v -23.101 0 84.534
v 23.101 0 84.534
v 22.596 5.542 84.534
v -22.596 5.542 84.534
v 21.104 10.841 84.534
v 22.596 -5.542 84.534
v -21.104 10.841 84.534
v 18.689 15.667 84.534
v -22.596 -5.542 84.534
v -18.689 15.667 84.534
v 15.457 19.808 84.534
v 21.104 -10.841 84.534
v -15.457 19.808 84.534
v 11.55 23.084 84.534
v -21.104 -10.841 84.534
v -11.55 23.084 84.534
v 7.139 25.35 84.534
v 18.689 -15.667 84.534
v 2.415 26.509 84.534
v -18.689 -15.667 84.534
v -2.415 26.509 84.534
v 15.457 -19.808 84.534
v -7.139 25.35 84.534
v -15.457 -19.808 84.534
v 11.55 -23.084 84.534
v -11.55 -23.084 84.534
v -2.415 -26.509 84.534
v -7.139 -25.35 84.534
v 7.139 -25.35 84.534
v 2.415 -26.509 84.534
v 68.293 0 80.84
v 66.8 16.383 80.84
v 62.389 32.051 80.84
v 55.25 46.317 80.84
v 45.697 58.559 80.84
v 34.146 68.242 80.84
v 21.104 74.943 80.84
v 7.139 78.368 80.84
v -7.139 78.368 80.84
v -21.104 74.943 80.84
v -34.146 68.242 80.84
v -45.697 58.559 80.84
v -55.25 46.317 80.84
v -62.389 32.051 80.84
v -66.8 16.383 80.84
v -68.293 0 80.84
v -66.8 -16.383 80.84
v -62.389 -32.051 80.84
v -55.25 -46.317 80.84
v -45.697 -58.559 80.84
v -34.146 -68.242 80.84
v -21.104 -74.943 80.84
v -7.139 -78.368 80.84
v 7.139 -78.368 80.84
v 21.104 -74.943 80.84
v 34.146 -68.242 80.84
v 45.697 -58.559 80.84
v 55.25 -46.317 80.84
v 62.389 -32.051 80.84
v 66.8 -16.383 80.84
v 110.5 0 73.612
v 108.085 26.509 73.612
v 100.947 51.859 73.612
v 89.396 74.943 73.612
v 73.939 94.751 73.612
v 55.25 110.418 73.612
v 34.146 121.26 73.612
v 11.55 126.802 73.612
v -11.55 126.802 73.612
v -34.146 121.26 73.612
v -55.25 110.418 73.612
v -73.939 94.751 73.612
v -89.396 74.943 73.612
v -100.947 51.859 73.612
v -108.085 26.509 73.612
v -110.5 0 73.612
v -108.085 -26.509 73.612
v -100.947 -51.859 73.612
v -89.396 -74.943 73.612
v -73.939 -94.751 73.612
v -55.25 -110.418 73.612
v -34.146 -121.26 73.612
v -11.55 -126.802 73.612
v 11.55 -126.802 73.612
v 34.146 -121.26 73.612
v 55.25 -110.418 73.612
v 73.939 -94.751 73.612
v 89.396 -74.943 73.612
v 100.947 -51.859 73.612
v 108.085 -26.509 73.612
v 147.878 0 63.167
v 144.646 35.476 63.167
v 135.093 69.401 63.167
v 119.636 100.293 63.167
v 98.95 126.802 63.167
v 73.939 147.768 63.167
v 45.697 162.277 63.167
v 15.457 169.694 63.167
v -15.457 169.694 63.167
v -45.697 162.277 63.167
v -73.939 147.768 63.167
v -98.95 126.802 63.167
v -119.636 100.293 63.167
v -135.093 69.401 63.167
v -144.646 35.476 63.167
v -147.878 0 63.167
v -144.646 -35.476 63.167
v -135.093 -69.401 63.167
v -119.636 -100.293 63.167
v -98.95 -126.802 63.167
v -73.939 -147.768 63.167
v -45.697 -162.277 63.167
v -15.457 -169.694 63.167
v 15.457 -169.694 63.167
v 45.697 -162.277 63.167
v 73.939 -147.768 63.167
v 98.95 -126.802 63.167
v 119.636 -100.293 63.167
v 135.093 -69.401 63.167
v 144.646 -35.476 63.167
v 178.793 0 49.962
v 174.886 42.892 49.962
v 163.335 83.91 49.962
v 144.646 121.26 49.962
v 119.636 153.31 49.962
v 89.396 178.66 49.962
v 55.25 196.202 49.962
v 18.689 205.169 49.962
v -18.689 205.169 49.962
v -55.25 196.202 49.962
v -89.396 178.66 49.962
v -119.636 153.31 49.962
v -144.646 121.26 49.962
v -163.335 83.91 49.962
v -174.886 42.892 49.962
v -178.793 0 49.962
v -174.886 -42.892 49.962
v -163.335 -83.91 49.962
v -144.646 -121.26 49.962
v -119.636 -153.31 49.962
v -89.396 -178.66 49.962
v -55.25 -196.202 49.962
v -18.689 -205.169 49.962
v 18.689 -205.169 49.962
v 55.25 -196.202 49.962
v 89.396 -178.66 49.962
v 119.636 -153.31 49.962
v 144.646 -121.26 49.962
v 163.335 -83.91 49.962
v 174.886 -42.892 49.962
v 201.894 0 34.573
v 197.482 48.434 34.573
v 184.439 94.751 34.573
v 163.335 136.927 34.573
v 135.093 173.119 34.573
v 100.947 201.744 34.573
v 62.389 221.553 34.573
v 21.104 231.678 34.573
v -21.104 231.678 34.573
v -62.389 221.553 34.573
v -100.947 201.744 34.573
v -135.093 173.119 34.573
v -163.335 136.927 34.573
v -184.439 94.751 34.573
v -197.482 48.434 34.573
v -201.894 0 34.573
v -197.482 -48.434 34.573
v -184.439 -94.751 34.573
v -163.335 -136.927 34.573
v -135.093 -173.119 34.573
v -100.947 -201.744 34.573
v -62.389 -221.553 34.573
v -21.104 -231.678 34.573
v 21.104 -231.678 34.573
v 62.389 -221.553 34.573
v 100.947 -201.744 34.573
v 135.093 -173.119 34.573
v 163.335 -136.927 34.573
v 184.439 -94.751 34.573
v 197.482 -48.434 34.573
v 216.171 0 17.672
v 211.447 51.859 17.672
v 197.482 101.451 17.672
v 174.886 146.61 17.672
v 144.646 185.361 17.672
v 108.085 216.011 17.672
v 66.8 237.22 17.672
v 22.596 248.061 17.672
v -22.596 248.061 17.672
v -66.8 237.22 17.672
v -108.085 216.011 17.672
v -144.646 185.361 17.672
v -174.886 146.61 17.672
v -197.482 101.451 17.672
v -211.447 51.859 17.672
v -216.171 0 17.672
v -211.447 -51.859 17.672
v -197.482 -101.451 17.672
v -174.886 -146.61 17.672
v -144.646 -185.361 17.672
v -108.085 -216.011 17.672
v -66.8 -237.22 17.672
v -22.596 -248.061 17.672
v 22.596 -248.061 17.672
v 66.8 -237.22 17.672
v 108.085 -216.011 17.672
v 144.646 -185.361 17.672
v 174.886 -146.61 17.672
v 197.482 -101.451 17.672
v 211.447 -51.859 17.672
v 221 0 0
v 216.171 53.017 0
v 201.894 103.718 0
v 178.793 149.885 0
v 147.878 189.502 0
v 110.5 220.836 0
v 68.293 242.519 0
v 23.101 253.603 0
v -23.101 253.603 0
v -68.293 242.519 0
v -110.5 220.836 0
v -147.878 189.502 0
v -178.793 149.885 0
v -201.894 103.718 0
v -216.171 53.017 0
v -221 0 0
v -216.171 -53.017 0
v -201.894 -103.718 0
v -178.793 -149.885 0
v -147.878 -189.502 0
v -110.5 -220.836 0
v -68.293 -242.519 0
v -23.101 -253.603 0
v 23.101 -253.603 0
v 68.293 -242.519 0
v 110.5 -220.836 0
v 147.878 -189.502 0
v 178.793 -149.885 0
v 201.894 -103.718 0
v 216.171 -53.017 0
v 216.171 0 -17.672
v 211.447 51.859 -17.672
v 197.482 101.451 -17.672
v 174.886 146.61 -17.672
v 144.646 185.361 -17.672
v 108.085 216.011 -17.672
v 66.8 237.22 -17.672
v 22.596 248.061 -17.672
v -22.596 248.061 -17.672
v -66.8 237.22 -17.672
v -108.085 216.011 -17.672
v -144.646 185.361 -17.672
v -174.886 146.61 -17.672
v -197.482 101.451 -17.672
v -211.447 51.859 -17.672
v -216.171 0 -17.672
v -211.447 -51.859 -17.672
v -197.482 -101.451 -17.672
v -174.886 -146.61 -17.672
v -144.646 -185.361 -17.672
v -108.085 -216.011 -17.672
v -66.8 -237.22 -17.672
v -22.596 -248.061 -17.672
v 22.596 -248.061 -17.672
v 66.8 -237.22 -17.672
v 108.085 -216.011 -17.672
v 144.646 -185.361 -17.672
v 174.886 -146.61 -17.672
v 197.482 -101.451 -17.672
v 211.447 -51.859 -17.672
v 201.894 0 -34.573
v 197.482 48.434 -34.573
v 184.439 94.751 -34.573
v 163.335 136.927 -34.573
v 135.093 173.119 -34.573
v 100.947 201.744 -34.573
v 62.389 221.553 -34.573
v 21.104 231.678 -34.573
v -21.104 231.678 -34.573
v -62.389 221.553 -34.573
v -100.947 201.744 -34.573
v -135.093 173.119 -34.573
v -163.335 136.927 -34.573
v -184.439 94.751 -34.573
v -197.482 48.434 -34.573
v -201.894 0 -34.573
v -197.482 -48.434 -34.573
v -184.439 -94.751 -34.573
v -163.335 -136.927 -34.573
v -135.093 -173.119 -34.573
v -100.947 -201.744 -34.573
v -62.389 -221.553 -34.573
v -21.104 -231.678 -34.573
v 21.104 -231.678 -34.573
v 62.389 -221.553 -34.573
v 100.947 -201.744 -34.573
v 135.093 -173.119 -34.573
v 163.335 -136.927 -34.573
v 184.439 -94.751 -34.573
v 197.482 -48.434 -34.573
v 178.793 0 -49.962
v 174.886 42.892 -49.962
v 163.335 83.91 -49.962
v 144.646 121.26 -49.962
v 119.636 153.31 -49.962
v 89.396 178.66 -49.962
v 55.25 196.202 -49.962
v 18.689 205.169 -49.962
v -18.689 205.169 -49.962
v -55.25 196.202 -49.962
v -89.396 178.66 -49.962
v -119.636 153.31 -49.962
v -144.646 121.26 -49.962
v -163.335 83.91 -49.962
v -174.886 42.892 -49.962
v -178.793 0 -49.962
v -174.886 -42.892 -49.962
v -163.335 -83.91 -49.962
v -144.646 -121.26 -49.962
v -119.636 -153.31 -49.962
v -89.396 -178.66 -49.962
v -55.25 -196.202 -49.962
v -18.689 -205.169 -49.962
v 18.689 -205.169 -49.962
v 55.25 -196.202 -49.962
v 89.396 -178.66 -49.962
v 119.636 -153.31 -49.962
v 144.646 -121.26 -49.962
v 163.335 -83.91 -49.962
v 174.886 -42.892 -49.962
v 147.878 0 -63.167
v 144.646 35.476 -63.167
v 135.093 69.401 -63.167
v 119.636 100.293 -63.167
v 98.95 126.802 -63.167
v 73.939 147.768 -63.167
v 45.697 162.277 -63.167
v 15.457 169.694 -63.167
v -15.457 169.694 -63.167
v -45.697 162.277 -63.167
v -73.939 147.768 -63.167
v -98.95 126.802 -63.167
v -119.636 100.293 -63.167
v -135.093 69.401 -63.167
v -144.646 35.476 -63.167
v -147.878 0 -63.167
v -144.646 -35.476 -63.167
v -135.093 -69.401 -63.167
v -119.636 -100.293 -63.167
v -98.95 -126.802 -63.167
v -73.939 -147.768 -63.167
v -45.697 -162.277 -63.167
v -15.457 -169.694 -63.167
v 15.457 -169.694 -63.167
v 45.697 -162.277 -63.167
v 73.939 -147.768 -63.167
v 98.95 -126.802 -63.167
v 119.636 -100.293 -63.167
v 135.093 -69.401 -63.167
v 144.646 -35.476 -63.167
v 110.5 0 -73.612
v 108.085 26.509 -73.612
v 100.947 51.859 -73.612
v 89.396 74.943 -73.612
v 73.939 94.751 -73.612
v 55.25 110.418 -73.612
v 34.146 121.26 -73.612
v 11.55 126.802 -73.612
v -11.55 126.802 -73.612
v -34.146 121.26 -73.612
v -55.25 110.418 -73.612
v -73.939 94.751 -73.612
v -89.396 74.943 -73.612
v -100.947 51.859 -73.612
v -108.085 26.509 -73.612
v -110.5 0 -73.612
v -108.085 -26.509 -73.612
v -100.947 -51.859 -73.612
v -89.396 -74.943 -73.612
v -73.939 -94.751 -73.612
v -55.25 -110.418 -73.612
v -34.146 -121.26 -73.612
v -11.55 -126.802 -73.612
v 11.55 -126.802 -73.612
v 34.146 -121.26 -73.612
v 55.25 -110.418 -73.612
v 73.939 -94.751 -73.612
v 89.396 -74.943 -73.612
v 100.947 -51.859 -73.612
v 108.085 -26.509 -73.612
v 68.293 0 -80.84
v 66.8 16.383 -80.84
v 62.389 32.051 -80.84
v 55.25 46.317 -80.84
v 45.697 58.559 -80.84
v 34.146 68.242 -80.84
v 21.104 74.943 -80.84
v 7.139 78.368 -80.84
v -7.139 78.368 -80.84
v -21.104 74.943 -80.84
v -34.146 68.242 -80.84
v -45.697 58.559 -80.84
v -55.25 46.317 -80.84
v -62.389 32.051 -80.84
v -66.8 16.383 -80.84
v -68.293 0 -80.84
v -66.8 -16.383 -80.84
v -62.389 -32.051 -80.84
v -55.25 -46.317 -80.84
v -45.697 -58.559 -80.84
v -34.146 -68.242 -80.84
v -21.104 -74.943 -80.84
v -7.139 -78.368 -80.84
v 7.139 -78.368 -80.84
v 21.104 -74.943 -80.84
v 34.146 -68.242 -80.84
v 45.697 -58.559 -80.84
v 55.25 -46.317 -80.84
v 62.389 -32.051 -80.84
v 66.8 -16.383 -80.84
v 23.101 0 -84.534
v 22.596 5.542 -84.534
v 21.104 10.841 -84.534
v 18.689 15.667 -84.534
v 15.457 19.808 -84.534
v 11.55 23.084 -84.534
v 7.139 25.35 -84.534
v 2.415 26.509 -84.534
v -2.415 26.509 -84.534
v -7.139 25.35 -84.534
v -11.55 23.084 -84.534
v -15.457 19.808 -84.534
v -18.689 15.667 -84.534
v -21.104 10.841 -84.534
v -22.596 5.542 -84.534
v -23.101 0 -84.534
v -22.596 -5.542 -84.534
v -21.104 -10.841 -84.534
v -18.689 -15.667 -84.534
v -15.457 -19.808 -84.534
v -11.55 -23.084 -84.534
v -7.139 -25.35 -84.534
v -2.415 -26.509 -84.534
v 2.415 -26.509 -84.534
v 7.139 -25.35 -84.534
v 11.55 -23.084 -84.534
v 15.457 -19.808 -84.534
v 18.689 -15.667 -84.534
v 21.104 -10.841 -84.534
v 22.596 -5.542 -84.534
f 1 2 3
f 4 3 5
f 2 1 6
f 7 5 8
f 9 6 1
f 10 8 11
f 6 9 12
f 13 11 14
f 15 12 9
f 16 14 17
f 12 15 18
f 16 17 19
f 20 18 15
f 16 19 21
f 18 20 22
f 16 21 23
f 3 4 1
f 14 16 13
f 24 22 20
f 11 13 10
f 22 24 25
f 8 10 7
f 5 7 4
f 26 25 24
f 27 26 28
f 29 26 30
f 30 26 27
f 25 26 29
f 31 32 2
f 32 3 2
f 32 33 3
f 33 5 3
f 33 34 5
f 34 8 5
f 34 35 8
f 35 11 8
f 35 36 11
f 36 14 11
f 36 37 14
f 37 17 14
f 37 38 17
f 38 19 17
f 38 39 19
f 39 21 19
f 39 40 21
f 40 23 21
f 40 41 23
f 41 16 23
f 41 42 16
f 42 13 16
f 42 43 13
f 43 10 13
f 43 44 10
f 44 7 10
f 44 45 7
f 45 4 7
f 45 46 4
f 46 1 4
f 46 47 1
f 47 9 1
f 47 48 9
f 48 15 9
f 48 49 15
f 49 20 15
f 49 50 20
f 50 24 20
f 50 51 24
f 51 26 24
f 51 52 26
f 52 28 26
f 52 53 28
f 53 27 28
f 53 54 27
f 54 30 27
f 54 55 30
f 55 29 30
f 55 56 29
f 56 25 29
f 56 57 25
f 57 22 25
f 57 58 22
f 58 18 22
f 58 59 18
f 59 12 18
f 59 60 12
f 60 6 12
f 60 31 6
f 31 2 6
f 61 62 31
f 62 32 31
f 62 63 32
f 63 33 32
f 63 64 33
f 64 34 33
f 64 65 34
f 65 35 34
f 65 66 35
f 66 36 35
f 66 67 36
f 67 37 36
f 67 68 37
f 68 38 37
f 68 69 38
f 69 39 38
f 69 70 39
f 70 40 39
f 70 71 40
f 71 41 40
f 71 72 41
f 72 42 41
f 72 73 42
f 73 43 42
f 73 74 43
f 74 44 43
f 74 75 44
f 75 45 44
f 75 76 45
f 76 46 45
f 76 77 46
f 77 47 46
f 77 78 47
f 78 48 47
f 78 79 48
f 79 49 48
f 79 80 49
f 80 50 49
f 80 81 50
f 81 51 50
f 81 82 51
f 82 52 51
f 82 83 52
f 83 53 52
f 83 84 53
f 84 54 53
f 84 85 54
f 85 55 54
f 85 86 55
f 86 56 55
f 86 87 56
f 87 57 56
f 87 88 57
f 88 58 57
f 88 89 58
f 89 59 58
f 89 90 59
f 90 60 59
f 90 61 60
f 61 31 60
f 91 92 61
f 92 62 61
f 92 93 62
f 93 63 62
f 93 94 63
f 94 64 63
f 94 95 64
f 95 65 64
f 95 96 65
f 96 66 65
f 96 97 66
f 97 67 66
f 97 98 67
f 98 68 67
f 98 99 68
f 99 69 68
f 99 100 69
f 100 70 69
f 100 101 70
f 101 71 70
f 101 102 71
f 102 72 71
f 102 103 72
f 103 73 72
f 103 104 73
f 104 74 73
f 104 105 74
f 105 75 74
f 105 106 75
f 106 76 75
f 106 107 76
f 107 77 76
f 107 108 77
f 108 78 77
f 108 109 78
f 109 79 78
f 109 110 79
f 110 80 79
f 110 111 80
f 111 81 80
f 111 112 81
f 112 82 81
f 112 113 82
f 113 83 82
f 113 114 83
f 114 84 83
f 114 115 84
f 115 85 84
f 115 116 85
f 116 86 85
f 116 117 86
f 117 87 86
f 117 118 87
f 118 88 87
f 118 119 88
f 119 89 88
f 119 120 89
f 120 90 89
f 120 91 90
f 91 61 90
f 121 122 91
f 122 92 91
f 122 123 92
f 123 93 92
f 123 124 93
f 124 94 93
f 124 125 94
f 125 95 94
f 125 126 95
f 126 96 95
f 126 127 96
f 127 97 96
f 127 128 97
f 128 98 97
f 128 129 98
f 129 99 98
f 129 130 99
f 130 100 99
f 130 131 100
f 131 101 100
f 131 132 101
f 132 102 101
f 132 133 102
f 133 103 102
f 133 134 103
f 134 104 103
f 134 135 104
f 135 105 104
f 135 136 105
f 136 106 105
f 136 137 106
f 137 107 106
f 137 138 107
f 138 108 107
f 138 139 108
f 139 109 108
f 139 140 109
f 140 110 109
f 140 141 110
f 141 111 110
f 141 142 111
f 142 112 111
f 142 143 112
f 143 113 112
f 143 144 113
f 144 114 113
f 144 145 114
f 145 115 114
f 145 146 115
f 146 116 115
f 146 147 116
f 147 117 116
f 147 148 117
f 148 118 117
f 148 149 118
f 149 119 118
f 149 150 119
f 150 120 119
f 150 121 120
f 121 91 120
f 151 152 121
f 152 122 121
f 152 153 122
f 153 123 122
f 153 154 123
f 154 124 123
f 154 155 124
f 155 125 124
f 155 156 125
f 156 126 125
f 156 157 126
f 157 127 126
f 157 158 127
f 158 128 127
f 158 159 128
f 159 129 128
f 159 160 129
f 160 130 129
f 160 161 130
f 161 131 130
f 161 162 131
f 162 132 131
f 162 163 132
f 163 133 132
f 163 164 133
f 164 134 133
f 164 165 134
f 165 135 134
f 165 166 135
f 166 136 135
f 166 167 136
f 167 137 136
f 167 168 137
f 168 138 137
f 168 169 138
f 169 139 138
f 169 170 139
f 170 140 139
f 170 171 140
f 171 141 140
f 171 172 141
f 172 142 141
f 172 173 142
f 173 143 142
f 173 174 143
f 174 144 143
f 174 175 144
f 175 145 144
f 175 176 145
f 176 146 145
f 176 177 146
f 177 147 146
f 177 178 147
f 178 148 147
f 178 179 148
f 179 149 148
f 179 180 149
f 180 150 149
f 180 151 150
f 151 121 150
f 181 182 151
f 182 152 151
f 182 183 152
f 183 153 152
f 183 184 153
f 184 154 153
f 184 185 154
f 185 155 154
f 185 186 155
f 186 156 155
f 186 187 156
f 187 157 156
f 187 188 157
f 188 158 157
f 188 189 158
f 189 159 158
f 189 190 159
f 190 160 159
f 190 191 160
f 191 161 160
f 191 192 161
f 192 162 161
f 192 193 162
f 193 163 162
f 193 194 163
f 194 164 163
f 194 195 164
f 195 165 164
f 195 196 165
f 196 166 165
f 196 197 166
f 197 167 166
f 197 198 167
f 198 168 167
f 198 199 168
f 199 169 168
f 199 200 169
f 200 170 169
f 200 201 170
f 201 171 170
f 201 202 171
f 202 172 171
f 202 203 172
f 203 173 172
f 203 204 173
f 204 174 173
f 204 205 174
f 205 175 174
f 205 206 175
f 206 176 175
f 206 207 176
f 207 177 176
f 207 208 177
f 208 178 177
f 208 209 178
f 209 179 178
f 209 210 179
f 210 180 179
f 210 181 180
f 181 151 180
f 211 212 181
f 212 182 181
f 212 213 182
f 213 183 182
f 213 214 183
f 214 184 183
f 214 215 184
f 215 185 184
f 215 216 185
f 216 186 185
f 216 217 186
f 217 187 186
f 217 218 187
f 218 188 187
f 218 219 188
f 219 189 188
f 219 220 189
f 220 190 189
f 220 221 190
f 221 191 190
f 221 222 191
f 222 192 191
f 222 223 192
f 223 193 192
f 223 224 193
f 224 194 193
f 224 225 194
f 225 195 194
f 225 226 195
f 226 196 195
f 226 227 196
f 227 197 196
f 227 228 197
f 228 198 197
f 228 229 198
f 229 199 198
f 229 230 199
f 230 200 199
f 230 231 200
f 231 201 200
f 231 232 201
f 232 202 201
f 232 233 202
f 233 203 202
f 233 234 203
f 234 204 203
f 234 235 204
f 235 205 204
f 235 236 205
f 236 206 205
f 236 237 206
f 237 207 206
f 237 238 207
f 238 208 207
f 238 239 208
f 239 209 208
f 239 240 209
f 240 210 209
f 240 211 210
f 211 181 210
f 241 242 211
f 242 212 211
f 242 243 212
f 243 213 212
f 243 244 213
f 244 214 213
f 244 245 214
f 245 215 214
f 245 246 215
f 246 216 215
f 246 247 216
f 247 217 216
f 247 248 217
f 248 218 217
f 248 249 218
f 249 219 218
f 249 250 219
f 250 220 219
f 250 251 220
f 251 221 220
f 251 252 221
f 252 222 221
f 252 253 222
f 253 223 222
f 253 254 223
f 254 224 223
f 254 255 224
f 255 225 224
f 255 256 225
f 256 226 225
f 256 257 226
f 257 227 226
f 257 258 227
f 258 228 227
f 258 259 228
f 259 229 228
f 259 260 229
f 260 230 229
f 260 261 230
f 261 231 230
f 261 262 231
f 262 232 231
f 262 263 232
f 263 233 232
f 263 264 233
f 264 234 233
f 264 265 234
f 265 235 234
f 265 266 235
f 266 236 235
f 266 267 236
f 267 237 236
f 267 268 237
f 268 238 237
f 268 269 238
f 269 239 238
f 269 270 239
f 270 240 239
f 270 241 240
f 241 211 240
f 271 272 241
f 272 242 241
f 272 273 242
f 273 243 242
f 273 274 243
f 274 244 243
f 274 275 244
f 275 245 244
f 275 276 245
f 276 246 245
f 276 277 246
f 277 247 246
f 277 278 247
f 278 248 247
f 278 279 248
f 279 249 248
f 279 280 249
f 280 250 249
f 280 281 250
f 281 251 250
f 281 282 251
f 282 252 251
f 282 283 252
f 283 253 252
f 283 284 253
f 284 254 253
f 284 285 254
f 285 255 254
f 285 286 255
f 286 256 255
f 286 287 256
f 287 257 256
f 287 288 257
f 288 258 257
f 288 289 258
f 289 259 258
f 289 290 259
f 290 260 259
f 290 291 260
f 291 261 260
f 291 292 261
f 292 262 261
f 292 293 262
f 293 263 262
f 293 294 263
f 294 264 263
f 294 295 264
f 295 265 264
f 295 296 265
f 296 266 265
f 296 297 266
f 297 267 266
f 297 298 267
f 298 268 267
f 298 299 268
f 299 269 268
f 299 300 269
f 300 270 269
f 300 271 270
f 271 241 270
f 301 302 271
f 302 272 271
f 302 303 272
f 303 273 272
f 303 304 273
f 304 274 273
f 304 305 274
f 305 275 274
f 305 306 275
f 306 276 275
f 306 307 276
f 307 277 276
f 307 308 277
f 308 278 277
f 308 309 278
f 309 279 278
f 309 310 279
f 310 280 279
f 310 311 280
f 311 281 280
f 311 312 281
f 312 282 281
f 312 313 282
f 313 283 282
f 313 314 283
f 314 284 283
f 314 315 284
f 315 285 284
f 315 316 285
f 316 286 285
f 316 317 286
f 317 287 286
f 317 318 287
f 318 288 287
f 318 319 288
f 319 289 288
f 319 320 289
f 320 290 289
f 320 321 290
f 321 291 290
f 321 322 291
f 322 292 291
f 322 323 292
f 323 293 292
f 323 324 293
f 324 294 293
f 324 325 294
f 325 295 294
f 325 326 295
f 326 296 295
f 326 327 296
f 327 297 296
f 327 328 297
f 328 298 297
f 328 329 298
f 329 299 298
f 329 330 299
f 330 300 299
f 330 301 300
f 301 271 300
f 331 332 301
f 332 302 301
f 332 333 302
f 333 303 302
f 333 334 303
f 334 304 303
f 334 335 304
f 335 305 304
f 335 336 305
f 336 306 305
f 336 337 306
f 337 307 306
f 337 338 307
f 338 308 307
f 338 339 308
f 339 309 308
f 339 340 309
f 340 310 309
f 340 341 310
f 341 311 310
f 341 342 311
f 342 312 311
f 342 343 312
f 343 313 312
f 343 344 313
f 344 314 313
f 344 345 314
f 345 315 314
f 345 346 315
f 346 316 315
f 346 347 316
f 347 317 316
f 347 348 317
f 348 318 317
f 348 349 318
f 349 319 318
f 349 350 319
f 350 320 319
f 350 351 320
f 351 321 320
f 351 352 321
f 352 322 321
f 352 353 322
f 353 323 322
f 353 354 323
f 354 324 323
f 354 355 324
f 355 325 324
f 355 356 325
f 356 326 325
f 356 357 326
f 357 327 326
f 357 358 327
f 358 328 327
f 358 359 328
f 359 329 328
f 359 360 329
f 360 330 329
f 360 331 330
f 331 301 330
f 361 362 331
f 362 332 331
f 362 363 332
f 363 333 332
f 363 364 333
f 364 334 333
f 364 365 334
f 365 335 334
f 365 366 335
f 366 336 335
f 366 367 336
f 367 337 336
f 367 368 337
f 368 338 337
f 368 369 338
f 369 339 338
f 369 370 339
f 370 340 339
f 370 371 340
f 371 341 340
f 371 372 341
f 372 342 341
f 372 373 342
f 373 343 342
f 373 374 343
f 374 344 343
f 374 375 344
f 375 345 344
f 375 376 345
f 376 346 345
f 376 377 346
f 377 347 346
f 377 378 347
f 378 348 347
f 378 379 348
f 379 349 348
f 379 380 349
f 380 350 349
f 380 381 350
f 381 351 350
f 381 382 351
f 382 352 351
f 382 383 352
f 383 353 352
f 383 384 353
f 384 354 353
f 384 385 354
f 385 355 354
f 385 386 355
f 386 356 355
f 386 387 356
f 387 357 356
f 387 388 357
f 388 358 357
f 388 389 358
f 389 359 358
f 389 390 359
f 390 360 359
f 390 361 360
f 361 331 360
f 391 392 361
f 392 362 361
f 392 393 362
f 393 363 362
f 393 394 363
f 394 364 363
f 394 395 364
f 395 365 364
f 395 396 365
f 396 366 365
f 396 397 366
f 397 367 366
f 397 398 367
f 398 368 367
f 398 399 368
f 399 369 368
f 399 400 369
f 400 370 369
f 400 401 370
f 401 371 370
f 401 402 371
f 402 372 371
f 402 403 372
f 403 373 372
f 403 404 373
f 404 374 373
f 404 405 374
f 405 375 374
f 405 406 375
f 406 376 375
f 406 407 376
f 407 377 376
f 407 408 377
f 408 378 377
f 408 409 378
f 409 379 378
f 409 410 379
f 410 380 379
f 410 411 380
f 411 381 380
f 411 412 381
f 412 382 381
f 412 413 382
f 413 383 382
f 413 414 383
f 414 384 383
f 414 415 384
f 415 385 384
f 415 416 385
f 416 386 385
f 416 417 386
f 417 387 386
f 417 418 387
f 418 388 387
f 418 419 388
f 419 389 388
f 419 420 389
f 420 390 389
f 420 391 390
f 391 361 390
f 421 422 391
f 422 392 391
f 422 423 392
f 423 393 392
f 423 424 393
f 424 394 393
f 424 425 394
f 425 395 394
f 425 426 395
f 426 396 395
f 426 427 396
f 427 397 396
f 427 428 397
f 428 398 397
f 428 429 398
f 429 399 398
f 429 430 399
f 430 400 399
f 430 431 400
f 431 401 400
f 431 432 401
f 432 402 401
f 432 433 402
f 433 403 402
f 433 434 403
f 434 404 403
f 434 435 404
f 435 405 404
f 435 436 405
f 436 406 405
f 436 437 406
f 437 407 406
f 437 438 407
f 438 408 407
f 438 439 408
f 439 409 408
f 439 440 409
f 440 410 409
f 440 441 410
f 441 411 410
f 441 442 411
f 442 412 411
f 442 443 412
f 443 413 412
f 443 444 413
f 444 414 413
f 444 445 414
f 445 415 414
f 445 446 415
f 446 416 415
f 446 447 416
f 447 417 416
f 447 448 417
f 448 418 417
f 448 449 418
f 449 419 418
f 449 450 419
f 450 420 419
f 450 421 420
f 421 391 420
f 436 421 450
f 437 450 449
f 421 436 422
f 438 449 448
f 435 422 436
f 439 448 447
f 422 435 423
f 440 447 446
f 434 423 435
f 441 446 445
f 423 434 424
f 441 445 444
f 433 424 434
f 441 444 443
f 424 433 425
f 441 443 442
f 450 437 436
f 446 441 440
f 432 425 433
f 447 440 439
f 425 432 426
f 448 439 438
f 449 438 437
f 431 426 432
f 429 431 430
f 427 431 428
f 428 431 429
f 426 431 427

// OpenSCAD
// Generated by SolidPython 1.0.1 on 2020-07-29 00:46:51


scale(v = [13, 15, 5]) {
	sphere(r = 17);
}
/***********************************************
*********      SolidPython code:      **********
************************************************
 
# import packages: SolidPython
from solid import *
from solid.utils import *
from itertools import chain, combinations, permutations


class Resize:

    def __init__(self, scad_file):
        self.scad_file = scad_file
        #self.scad_file = import_scad(scad_file)
        # cone/cylinder param:
        self.r1 = 0
        self.r2 = 0
        self.h = 0
        # rectangular prism param:
        self.w = 0
        self.l = 0
        # ellipse param:
        self.r = 0

    # import OpenScad code (file name corresponds to shape)


    # classify shape + parameters
    def assign(self, param1, param2, param3):
        if self.scad_file == 'cone.scad':
            self.r1 = param1
            self.r2 = param2
            self.h = param3
        elif self.scad_file == 'cylinder.scad':
            self.r1 = param1
            self.r2 = param2
            self.h = param3
        elif self.scad_file == 'rectangularPrism.scad':
            self.h = param1
            self.l = param2
            self.w = param3
        else:
            self.r = param1
            self.h = param2

    # resize parameters
    def iterate(self):
        x = range(3, 20, 2)
        i = 1
        if self.scad_file == 'cone.scad':
            tempList = list(permutations(x, 2))
            for temp in tempList:
                param1 = temp[0]
                param2 = temp[1]
                filepath = 'produced_scad_files/' + 'cone' + str(param1) + '_' + str(param2) + '_' + '.scad'
                scad_render_to_file(cylinder(h=param1, r1=param2, r2=0), filepath)

        elif self.scad_file == 'cylinder.scad':
            tempList = list(permutations(x, 3))
            for temp in tempList:
                param1 = temp[0]
                param2 = temp[1]
                filepath = 'produced_scad_files/' + 'cylinder' + str(param1) + '_' + str(param2) + '_' + '.scad'
                scad_render_to_file(cylinder(h=param1, r1=param2, r2=param2), filepath)

        elif self.scad_file == 'rectangularPrism.scad':
            tempList = list(permutations(x, 3))
            for temp in tempList:
                param1 = temp[0]
                param2 = temp[1]
                param3 = temp[2]
                filepath = 'produced_scad_files/' + 'rectangularPrism' + str(param1) + '_' + str(param2) + '_' + str(
                    param3) + '.scad'
                scad_render_to_file(cube(size=(param1, param2, param3)), filepath)

        elif self.scad_file == 'ellipse.scad':
            tempList = list(permutations(x, 4))
            for temp in tempList:
                param1 = temp[0]
                param2 = temp[1]
                param3 = temp[2]
                param4 = temp[3]
                filepath = 'produced_scad_files/' + 'ellipse' + str(param1) + '_' + str(param2) + '_' + str(param3) + '_' + str(param4) + '.scad'
                scad_render_to_file(scale([param1, param2, param3])(sphere(r=param4)), filepath)

    def render_to_scadfile(self):
        scad_render_to_file(scad, 'example.scad') 
 
************************************************/
